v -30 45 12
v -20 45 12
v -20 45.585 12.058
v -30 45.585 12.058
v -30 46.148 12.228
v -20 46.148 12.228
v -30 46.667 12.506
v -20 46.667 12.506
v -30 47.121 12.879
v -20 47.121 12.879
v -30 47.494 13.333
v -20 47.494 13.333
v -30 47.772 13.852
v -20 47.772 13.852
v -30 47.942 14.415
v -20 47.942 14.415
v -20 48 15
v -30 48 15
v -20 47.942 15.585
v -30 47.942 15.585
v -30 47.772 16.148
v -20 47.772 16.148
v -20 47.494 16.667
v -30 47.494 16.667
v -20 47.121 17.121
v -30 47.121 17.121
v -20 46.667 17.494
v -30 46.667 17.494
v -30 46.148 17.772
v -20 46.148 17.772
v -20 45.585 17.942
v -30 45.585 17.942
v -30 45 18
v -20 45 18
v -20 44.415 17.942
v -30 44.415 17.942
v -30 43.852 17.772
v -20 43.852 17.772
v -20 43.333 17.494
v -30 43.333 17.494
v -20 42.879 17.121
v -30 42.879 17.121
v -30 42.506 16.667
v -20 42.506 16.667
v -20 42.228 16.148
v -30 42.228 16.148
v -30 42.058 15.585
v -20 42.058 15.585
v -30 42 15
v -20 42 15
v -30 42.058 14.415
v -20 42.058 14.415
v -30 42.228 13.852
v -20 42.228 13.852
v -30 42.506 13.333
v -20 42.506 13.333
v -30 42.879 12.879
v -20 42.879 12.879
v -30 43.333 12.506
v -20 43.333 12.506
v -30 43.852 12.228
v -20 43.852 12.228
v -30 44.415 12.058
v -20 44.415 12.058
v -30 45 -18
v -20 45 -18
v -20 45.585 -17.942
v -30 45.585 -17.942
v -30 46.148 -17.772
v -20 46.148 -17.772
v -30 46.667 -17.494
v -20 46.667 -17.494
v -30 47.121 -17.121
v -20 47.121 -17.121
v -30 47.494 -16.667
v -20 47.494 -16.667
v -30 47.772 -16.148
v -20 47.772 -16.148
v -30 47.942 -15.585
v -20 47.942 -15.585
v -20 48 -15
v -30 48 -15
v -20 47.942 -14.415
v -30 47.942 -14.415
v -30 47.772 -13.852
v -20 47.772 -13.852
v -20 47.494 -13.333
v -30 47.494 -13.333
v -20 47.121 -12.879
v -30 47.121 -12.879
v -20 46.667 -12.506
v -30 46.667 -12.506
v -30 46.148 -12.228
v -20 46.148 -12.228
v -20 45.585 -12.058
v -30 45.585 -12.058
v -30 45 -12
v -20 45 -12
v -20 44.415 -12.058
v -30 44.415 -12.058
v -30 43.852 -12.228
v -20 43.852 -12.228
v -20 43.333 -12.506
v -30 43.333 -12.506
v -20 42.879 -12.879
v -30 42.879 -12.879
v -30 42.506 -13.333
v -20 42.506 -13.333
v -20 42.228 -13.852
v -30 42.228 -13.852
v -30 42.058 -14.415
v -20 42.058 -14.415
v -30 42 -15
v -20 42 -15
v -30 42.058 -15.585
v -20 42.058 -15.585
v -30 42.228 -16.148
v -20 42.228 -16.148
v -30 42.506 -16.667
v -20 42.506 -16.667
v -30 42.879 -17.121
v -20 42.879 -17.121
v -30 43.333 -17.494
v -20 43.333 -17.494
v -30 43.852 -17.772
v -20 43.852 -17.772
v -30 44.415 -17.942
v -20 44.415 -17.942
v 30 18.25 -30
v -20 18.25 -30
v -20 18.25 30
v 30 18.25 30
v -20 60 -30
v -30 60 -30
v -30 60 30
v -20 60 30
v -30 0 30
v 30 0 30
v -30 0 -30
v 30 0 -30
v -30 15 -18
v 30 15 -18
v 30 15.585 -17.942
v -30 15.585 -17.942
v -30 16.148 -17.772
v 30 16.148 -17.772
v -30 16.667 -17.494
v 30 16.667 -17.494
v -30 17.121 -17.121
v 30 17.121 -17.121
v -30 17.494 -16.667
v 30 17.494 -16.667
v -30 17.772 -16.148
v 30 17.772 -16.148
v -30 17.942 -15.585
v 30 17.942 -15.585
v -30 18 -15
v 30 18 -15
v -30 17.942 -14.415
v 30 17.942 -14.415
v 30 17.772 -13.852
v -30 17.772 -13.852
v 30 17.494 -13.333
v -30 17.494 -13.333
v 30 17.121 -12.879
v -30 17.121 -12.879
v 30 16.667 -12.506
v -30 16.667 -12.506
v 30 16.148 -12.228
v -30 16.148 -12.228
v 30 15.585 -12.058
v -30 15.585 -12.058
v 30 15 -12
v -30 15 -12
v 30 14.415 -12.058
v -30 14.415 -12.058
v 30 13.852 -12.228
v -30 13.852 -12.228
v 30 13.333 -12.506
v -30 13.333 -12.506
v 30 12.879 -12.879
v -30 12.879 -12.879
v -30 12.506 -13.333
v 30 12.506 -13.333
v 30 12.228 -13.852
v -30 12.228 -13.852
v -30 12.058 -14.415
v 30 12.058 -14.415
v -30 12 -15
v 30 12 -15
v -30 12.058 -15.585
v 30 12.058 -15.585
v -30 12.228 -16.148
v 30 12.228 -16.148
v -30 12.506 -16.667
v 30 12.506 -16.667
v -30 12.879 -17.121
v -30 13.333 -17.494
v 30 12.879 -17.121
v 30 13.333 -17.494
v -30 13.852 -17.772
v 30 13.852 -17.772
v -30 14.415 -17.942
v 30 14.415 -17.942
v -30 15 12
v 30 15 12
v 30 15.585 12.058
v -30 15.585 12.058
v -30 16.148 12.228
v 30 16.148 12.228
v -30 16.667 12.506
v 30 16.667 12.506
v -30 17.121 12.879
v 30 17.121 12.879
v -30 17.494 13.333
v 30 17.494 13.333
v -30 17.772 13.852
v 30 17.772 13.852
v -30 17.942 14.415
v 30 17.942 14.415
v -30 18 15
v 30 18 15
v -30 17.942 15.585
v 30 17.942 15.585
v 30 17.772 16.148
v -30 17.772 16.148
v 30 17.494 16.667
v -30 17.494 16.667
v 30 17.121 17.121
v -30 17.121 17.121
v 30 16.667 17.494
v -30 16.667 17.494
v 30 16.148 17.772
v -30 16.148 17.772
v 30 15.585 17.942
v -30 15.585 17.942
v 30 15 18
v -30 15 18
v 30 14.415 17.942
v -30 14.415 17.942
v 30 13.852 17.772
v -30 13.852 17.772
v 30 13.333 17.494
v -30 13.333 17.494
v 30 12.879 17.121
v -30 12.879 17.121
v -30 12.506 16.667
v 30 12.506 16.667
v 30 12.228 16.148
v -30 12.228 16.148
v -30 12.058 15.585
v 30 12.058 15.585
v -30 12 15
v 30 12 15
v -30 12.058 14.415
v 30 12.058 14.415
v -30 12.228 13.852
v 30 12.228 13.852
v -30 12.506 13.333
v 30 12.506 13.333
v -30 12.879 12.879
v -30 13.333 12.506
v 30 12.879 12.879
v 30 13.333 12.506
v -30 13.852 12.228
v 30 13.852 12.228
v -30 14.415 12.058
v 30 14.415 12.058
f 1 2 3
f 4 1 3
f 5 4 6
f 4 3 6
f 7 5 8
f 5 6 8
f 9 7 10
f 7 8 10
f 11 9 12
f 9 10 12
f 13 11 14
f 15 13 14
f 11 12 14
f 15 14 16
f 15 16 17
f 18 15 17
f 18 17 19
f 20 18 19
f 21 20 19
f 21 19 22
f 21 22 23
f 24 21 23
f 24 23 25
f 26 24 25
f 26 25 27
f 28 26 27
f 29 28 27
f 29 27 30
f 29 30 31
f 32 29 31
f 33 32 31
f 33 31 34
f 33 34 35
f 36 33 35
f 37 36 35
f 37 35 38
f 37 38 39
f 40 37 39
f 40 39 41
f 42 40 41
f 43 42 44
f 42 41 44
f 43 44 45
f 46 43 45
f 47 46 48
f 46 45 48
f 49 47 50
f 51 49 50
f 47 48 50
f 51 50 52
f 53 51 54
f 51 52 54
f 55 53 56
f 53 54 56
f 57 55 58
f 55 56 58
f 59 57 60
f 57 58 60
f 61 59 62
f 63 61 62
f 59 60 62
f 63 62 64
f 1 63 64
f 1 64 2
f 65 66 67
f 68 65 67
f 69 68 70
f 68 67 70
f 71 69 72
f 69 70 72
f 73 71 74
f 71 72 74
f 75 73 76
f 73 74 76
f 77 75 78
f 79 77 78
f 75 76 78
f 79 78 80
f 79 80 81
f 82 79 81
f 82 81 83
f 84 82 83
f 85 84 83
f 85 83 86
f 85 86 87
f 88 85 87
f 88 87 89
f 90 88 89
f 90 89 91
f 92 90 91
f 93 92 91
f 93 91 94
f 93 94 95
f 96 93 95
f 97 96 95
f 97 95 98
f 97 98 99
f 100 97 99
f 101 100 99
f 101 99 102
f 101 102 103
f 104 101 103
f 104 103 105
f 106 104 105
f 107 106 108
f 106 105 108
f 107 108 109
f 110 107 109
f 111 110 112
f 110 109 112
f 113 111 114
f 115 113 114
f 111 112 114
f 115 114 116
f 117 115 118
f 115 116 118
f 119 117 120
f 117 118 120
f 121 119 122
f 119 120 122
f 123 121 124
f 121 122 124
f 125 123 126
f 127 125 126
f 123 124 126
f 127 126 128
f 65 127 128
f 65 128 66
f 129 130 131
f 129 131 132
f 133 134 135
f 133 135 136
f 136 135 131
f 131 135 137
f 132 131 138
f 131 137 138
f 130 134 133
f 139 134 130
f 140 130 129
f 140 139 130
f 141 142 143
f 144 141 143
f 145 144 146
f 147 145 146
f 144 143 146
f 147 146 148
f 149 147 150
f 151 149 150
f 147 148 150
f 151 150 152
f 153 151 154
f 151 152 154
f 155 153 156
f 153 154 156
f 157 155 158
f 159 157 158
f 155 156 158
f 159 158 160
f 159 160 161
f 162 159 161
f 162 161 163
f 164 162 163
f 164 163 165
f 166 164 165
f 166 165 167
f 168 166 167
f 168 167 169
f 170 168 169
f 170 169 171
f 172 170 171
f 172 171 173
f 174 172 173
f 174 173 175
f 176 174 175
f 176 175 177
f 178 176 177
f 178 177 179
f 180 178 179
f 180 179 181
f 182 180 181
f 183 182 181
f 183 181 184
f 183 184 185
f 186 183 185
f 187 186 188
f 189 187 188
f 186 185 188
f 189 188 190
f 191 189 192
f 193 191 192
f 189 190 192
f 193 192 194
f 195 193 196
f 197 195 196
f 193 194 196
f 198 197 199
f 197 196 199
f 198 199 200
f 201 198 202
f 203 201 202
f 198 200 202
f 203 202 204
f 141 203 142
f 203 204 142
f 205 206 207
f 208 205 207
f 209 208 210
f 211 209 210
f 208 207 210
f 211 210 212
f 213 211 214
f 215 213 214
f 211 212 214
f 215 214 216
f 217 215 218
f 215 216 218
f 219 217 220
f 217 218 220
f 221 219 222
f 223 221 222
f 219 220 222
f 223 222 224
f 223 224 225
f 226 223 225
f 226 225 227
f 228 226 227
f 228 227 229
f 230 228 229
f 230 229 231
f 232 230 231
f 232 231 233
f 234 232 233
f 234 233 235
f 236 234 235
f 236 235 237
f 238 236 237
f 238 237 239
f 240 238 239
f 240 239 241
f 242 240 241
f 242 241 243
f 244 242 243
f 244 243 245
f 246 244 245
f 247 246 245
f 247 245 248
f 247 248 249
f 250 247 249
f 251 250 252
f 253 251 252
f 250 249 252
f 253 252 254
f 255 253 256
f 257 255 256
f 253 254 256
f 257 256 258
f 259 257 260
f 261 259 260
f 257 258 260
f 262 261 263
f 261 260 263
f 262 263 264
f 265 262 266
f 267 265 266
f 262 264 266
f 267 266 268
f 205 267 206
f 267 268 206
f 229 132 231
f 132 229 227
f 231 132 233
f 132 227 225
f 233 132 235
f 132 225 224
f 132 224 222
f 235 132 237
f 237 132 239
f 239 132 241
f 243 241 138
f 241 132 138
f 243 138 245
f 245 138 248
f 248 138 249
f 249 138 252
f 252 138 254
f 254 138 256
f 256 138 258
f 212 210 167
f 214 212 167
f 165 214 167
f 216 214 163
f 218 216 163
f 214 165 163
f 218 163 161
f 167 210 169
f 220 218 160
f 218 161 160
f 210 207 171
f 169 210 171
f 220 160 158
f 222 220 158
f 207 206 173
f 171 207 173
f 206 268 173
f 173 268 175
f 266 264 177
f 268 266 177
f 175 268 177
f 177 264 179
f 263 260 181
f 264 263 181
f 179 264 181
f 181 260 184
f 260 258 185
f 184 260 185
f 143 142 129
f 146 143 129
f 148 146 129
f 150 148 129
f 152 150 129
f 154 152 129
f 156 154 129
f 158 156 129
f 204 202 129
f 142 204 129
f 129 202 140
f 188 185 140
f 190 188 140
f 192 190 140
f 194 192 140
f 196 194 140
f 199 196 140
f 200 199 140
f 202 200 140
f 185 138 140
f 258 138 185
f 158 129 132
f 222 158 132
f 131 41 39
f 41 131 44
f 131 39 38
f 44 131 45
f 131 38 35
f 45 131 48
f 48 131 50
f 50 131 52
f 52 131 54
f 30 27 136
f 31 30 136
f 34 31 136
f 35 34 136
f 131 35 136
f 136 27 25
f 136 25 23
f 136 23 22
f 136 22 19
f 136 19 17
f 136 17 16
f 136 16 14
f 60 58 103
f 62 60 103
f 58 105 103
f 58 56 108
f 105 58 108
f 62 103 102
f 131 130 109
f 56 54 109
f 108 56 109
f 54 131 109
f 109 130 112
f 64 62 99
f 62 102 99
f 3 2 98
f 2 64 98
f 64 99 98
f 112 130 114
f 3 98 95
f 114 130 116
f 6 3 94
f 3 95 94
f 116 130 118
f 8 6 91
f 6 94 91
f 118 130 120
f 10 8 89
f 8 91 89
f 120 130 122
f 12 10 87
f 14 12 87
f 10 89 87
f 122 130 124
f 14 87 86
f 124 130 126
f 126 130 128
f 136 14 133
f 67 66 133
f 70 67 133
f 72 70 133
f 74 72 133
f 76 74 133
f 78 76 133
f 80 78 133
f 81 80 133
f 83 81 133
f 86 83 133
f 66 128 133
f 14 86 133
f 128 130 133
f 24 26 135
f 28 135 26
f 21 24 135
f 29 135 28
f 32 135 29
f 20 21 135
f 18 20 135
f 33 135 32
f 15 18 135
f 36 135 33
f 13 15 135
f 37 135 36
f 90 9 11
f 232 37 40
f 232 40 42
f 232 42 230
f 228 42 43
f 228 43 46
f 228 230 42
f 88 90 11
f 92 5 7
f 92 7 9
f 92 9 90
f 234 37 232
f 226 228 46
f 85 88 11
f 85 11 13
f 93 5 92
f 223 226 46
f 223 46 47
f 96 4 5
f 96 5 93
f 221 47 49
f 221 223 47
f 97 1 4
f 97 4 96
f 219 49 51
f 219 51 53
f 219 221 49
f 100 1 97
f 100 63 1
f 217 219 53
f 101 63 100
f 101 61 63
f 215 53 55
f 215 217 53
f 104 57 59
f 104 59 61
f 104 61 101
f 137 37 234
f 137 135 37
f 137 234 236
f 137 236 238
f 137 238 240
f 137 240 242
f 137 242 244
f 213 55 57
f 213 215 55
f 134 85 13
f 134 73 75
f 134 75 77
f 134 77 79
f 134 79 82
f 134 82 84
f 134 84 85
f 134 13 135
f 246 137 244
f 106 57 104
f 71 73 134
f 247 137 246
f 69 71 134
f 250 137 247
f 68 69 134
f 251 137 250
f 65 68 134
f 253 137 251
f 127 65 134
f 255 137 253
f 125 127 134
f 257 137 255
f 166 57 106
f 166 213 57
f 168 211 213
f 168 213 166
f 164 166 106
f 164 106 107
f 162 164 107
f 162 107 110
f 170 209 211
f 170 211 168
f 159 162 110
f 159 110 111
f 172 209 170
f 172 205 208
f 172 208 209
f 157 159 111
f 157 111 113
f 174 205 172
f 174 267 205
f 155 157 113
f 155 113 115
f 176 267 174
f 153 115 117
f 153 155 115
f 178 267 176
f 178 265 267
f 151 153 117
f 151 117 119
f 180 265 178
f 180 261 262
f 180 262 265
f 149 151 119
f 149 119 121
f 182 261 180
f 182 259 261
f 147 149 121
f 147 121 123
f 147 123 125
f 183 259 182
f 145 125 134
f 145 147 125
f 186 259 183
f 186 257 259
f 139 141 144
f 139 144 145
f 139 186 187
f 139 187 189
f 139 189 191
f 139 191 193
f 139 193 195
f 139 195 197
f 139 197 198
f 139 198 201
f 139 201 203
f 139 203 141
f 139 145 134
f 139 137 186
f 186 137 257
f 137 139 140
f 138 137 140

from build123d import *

# Parameters (mm, degrees)
SKETCH1_W            = 60
SKETCH1_H            = 60
BOSS_EXTRUDE1_DEPTH  = 60
SKETCH2_R            = 3
CUT_EXTRUDE1_DEPTH   = 61
LPATTERN1_COUNT      = 2
LPATTERN1_PITCH      = 30
LPATTERN1_COUNT_DIR2 = 2
LPATTERN1_PITCH_DIR2 = 30
CUT_EXTRUDE3_REACH   = 62
SKETCH4_W            = 40
SKETCH4_H            = 41.75
CUT_EXTRUDE5_REACH   = 62
SKETCH6_W            = 10
SKETCH6_H            = 41.75


with BuildPart() as part:
    # Sketch1 → Boss-Extrude1 (new body)
    with BuildSketch(Plane(origin=(0, 0, 0), x_dir=(1, 0, 0), z_dir=(0, 1, 0))):
        Rectangle(SKETCH1_W, SKETCH1_H)
    extrude(amount=BOSS_EXTRUDE1_DEPTH)

    # Sketch2 → Cut-Extrude1 (cut, through all)
    with BuildSketch(Plane(origin=(30, 0, 0), x_dir=(0, 0, -1), z_dir=(1, 0, 0))):
        with Locations((-15, 45)):
            Circle(SKETCH2_R)
    cut_extrude1 = extrude(amount=-CUT_EXTRUDE1_DEPTH, mode=Mode.SUBTRACT)

    # LPattern1: Cut-Extrude1 2 × 2
    with Locations(*[(0, -j * LPATTERN1_PITCH_DIR2, -i * LPATTERN1_PITCH) for i in range(LPATTERN1_COUNT) for j in range(LPATTERN1_COUNT_DIR2) if (i, j) != (0, 0)]):
        add(cut_extrude1, mode=Mode.SUBTRACT)

    # Sketch4 → Cut-Extrude3 (cut, up to next)
    with BuildSketch(Plane(origin=(0, 0, -30), x_dir=(-1, 0, 0), z_dir=(0, 0, -1)), mode=Mode.PRIVATE) as cut_extrude3_sk1:
        with Locations((0, 39.125)):
            Rectangle(SKETCH4_W, SKETCH4_H)
    cut_extrude3_tool1 = extrude(cut_extrude3_sk1.sketch, amount=-CUT_EXTRUDE3_REACH, mode=Mode.PRIVATE) & part.part
    add(cut_extrude3_tool1.solids().sort_by_distance((0, 39.125, -30))[0], mode=Mode.SUBTRACT)

    # Sketch6 → Cut-Extrude5 (cut, up to next)
    with BuildSketch(Plane.XY.offset(30), mode=Mode.PRIVATE) as cut_extrude5_sk1:
        with Locations((25, 39.125)):
            Rectangle(SKETCH6_W, SKETCH6_H)
    cut_extrude5_tool1 = extrude(cut_extrude5_sk1.sketch, amount=-CUT_EXTRUDE5_REACH, mode=Mode.PRIVATE) & part.part
    add(cut_extrude5_tool1.solids().sort_by_distance((25, 39.125, 30))[0], mode=Mode.SUBTRACT)


solid = part.part
